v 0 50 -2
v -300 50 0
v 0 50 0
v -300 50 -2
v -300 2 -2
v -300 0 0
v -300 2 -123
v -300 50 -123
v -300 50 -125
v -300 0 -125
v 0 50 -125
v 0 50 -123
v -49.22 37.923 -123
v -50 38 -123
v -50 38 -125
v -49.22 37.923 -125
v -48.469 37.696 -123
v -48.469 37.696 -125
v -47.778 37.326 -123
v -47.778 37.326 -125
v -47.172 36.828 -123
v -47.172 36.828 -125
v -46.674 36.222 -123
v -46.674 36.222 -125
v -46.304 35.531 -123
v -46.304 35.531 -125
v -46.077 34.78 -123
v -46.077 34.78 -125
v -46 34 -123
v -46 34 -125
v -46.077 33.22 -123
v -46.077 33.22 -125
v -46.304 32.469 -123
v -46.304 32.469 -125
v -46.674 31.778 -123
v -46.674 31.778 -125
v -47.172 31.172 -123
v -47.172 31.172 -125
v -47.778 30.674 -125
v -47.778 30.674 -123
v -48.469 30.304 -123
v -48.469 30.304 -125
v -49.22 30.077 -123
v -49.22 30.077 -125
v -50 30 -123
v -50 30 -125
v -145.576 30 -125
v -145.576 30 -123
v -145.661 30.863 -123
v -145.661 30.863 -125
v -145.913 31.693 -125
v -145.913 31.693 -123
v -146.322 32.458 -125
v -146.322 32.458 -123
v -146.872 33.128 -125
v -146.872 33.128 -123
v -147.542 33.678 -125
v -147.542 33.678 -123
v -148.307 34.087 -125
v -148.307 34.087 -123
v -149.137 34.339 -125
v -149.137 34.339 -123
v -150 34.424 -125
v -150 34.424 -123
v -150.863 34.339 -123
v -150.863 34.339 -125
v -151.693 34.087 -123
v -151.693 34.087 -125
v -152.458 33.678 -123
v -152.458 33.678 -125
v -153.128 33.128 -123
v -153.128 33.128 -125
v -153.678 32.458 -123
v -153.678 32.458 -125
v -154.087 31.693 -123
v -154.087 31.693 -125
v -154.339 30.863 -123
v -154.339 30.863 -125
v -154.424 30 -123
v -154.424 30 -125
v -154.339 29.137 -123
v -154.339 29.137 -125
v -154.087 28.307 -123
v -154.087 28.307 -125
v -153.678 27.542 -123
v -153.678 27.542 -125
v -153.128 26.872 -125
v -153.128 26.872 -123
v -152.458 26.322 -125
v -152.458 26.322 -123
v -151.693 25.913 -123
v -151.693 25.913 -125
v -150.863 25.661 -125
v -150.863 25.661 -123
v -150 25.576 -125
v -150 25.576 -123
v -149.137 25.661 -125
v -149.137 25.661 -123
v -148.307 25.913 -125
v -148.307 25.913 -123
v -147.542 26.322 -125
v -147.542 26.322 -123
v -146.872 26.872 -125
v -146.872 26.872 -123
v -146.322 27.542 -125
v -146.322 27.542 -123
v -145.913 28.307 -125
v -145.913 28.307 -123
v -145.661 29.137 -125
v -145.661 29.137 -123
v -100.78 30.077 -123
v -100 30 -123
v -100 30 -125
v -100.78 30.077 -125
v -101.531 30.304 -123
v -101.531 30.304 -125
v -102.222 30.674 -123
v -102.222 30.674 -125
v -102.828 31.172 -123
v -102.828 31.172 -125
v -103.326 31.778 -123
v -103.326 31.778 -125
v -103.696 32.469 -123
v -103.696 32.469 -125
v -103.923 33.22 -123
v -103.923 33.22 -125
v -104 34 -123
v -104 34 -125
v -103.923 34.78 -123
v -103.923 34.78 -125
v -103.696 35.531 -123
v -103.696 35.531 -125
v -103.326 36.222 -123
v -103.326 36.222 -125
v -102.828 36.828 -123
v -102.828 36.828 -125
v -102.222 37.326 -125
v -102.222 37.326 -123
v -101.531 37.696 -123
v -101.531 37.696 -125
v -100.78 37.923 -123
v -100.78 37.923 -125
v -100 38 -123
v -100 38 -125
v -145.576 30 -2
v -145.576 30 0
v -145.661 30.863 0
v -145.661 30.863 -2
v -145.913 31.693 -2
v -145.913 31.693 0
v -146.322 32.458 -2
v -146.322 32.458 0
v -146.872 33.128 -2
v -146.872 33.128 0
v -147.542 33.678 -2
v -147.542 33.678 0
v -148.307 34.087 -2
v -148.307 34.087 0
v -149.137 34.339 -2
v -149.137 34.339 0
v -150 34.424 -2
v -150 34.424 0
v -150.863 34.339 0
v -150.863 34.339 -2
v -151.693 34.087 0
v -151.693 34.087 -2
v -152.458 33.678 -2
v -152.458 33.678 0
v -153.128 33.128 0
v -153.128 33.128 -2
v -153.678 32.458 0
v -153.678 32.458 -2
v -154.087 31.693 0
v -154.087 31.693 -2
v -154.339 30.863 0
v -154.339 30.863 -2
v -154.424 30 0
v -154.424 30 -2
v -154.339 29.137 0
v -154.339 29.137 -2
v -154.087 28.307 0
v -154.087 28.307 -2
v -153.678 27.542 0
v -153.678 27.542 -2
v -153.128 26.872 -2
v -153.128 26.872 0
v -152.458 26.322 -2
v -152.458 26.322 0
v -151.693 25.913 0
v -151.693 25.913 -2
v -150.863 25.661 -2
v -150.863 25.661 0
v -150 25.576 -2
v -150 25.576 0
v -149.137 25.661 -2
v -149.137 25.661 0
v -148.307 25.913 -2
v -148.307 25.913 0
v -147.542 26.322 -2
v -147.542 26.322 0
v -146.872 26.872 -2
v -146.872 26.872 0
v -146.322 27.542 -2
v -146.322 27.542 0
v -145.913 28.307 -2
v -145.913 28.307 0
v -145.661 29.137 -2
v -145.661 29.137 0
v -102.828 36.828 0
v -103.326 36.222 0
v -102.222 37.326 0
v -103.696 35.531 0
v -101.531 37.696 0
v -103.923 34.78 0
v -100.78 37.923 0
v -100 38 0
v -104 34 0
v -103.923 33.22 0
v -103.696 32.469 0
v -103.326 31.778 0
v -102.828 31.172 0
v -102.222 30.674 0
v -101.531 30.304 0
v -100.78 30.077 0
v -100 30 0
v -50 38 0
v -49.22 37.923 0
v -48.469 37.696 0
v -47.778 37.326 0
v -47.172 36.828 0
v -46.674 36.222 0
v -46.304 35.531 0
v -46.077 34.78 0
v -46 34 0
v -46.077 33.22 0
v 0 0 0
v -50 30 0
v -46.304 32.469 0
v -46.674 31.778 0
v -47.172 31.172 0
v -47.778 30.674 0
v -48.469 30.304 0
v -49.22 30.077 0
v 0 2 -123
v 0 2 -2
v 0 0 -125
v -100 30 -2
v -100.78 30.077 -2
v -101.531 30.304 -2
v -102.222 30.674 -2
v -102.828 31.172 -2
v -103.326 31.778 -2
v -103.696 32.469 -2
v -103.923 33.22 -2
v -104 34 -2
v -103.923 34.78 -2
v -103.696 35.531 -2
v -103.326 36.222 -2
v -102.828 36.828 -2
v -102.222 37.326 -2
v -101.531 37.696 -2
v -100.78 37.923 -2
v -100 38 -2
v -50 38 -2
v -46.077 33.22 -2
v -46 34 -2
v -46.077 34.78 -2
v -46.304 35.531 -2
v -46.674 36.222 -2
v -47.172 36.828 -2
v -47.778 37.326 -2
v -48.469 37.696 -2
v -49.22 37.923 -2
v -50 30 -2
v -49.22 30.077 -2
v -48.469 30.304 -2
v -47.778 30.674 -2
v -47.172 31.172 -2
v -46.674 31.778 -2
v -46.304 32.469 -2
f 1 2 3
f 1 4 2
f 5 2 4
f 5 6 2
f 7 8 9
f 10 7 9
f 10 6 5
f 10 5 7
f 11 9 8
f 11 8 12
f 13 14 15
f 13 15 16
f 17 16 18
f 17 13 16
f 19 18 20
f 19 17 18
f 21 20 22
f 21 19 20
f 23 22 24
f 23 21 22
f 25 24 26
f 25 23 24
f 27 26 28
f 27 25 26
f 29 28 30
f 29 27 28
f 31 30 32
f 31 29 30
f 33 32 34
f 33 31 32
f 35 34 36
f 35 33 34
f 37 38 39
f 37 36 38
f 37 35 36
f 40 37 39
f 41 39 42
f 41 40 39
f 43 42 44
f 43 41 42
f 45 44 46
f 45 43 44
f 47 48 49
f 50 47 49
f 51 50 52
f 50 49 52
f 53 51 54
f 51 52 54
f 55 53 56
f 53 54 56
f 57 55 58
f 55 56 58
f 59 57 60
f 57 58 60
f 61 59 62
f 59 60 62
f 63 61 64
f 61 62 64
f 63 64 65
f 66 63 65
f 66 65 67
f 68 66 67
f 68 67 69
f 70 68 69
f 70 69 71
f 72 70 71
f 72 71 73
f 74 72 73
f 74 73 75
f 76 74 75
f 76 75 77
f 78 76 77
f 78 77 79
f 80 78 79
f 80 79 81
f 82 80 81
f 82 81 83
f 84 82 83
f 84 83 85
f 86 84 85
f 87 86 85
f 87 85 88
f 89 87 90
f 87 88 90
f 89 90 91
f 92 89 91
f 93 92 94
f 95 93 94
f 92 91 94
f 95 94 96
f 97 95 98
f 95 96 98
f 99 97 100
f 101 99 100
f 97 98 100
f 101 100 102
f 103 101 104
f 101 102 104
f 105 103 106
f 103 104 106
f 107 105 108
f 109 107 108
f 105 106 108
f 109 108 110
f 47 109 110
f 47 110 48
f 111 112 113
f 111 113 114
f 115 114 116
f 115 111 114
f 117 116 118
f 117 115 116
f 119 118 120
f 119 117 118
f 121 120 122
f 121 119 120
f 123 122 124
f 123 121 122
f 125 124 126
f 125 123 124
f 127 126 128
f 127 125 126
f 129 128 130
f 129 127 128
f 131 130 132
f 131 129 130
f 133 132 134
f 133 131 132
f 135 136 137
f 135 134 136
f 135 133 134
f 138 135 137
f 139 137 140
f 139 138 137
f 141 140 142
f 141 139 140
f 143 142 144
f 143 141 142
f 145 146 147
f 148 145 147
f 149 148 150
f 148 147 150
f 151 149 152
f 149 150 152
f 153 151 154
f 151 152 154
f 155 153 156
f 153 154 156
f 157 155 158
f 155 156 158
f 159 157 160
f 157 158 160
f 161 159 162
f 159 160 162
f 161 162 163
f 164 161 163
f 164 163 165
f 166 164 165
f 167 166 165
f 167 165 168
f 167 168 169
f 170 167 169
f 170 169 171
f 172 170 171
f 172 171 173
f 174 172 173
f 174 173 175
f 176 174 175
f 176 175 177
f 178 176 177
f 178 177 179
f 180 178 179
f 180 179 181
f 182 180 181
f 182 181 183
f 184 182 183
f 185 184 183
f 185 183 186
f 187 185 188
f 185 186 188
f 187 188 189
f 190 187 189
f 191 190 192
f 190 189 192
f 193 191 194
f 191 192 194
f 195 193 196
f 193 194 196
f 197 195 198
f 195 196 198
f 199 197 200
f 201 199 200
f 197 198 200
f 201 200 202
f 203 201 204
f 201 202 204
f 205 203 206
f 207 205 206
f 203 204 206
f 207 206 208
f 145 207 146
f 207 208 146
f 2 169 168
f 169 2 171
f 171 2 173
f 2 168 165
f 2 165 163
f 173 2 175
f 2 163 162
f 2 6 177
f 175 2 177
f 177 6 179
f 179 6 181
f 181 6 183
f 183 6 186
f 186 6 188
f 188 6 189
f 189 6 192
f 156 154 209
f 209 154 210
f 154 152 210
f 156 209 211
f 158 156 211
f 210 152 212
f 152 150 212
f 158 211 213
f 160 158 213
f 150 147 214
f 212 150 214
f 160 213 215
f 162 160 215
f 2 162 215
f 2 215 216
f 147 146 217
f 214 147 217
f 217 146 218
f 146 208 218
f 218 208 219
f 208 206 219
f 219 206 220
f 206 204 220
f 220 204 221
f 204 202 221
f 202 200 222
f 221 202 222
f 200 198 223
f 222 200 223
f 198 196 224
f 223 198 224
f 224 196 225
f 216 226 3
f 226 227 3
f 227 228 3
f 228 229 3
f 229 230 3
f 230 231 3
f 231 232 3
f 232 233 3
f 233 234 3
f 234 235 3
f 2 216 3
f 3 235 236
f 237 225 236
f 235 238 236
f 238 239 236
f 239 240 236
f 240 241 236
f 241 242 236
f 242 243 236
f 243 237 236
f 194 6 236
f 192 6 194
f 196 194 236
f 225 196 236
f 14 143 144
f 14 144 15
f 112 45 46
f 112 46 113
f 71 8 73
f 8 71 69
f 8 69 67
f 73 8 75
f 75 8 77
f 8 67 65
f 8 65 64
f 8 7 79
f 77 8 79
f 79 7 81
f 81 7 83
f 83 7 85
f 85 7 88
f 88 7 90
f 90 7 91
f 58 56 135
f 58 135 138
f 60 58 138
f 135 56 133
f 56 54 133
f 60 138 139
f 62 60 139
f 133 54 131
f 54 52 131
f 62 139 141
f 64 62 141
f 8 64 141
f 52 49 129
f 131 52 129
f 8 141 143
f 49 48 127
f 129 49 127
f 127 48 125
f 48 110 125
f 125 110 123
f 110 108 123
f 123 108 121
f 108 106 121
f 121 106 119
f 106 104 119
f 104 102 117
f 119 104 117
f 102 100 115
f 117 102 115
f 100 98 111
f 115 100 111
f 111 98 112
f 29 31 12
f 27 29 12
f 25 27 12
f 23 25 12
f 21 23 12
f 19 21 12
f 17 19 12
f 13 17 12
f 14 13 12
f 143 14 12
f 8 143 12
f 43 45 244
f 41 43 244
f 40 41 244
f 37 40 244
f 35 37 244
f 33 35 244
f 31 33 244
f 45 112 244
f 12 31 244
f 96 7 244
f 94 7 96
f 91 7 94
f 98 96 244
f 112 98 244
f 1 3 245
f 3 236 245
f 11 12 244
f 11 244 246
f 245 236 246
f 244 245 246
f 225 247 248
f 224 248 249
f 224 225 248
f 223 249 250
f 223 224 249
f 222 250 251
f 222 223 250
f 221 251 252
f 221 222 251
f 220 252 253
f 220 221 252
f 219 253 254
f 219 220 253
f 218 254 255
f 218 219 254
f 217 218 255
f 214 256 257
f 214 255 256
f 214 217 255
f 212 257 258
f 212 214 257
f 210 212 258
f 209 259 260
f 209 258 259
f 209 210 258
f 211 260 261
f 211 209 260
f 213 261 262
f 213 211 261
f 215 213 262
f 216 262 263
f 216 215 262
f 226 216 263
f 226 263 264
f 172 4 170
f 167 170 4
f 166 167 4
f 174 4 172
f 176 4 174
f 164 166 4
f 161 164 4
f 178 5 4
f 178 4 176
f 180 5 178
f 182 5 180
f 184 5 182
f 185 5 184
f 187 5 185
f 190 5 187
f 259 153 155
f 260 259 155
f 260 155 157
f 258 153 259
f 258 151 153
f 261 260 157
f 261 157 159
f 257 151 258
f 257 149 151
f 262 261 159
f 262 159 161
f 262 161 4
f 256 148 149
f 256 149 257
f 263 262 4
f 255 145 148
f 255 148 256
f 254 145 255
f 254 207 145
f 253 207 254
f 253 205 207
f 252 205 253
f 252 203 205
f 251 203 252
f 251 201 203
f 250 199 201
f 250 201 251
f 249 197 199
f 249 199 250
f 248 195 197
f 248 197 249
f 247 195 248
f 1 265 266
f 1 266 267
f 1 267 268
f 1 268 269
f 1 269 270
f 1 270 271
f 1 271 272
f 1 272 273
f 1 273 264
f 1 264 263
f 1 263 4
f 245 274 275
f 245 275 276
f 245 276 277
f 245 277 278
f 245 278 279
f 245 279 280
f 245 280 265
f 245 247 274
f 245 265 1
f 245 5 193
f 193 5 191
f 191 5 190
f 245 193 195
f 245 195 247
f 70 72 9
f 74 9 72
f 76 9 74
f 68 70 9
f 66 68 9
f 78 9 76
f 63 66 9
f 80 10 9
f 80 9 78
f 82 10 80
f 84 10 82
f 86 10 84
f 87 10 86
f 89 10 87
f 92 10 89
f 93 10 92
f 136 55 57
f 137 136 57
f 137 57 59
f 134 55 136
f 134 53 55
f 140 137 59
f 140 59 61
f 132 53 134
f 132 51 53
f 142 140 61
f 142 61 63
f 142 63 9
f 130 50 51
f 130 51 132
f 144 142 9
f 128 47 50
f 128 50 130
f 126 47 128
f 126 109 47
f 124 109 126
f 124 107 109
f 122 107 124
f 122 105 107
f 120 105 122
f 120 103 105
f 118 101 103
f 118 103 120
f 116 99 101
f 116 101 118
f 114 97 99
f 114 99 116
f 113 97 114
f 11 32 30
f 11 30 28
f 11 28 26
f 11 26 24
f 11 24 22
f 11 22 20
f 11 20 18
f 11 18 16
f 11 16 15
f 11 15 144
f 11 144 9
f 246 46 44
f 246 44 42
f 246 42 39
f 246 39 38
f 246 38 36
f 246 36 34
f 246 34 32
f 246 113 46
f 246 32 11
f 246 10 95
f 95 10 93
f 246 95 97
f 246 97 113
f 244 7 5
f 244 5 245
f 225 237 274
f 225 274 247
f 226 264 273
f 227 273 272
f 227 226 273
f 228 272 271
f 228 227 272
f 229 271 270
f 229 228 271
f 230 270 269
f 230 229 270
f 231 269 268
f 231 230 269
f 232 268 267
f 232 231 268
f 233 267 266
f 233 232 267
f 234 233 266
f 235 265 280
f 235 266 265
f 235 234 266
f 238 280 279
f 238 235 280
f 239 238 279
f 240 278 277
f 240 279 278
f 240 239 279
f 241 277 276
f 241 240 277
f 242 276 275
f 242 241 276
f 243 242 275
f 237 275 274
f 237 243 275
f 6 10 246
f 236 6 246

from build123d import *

# Parameters (mm, degrees)
SKETCH1_W           = 300
SKETCH1_H           = 125
BOSS_EXTRUDE1_DEPTH = 50
SHELL1_T            = -2
CUT_EXTRUDE1_DEPTH  = 142
SKETCH3_R           = 4.423757835
CUT_EXTRUDE2_DEPTH  = 132


with BuildPart() as part:
    # Sketch1 → Boss-Extrude1 (new body)
    with BuildSketch(Plane(origin=(0, 0, 0), x_dir=(1, 0, 0), z_dir=(0, 1, 0))):
        with Locations((-150, 62.5)):
            Rectangle(SKETCH1_W, SKETCH1_H)
    extrude(amount=BOSS_EXTRUDE1_DEPTH)

    # Shell1
    shell1_openings = [part.faces().sort_by_distance(p)[0] for p in [
        (-150, 50, -62.5),
        (-300, 25, -62.5),
        (0, 25, -62.5),
    ]]
    offset(amount=SHELL1_T, openings=shell1_openings, kind=Kind.INTERSECTION)

    # Sketch2 → Cut-Extrude1 (cut)
    with BuildSketch(Plane.XY):
        with BuildLine():
            Line((-100, 38), (-50, 38))
            ThreePointArc((-50, 38), (-46, 34), (-50, 30))
            Line((-50, 30), (-100, 30))
            ThreePointArc((-100, 30), (-104, 34), (-100, 38))
        make_face()
    extrude(amount=-CUT_EXTRUDE1_DEPTH, mode=Mode.SUBTRACT)

    # Sketch3 → Cut-Extrude2 (cut)
    with BuildSketch(Plane.XY):
        with Locations((-150, 30)):
            Circle(SKETCH3_R)
    extrude(amount=-CUT_EXTRUDE2_DEPTH, mode=Mode.SUBTRACT)


solid = part.part
